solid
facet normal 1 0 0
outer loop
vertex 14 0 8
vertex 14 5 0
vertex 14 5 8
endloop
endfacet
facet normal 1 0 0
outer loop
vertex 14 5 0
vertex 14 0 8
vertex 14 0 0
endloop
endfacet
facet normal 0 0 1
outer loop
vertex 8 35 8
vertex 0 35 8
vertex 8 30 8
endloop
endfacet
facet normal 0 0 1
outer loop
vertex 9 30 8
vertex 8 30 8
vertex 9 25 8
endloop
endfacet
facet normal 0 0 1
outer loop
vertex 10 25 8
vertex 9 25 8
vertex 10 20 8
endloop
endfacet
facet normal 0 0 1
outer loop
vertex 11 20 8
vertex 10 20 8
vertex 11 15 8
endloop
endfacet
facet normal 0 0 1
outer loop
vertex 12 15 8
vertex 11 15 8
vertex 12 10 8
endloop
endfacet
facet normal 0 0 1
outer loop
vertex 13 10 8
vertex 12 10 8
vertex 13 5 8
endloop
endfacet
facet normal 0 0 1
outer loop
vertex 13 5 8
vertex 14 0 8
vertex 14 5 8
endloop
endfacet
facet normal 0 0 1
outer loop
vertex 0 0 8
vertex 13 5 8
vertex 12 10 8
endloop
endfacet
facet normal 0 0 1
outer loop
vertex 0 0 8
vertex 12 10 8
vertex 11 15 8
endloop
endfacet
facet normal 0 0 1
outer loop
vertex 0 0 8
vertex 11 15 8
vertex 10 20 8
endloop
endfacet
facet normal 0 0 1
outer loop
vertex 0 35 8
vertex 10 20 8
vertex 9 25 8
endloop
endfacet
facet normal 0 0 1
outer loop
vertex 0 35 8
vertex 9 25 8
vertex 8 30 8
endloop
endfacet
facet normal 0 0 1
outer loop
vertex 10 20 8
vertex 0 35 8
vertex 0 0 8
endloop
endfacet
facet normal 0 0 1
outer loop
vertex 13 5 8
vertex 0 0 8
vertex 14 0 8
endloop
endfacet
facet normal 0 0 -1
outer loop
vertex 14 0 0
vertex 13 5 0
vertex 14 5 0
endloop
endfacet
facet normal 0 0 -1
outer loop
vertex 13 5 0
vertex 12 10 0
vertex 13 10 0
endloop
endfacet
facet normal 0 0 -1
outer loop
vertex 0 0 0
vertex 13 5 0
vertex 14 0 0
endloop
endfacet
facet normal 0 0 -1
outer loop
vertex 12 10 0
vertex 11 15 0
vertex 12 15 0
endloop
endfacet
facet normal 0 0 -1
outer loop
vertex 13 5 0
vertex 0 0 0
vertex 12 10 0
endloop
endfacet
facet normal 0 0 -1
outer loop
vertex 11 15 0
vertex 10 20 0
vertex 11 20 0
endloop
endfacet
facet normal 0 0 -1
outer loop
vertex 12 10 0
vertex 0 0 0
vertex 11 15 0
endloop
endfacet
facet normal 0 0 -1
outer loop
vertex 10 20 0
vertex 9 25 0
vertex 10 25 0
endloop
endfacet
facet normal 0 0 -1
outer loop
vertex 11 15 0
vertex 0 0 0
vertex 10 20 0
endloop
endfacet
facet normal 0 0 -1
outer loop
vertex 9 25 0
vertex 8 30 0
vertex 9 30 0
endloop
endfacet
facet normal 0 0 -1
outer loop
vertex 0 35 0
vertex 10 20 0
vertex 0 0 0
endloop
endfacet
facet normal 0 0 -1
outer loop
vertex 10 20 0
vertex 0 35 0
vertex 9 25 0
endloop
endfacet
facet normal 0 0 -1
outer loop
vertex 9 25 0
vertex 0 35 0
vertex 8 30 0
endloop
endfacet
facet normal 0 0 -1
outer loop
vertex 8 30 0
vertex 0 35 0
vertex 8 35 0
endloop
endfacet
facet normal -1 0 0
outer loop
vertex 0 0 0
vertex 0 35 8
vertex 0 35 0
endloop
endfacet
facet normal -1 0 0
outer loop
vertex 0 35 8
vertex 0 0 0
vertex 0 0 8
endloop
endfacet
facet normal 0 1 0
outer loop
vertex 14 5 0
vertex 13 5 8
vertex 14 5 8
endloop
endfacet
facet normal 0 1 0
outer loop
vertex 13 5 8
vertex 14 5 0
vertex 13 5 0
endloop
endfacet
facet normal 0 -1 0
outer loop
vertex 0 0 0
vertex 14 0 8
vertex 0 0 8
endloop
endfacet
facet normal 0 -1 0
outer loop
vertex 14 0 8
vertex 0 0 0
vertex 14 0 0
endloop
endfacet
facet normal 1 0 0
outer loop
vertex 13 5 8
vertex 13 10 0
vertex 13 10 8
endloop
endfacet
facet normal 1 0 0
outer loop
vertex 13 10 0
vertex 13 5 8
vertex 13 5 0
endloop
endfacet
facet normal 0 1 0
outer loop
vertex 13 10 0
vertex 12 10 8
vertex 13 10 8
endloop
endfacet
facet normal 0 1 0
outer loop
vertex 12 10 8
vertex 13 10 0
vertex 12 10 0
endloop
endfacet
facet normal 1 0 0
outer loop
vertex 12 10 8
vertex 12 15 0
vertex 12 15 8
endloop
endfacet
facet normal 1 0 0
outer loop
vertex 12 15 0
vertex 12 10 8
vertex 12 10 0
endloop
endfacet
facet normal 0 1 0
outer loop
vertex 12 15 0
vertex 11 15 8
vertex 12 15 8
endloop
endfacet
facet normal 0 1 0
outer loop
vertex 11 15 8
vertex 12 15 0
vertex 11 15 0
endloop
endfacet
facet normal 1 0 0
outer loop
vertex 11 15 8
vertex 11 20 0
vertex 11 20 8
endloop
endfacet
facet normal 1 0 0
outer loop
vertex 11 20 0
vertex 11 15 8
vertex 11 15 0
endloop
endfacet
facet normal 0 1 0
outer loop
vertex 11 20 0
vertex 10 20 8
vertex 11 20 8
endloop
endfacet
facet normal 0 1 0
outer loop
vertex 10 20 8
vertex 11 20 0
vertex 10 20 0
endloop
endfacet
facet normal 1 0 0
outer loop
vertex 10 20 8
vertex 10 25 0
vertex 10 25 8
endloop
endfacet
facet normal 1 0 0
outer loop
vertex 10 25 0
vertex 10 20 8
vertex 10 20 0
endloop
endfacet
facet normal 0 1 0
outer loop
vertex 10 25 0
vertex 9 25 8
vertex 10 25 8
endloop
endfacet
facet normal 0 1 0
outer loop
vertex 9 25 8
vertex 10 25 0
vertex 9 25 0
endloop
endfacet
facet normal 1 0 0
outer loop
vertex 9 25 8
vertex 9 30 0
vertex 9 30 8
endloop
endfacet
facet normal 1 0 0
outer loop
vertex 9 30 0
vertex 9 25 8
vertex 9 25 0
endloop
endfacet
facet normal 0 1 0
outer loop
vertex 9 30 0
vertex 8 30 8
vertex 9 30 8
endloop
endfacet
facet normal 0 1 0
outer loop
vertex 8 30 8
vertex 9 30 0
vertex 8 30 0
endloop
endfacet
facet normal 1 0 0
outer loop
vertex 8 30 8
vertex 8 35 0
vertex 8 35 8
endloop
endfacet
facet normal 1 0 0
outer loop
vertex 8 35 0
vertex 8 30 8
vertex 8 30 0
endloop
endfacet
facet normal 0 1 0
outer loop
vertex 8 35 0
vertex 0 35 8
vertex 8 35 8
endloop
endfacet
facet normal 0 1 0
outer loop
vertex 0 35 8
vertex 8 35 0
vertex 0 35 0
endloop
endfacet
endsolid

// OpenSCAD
start=8;
step=1;
end=14;
depth=5;
width=8;

for(index=[0:(end-start)/step]) {
  cube([end-index*step,depth*(index+1),width]);
}
